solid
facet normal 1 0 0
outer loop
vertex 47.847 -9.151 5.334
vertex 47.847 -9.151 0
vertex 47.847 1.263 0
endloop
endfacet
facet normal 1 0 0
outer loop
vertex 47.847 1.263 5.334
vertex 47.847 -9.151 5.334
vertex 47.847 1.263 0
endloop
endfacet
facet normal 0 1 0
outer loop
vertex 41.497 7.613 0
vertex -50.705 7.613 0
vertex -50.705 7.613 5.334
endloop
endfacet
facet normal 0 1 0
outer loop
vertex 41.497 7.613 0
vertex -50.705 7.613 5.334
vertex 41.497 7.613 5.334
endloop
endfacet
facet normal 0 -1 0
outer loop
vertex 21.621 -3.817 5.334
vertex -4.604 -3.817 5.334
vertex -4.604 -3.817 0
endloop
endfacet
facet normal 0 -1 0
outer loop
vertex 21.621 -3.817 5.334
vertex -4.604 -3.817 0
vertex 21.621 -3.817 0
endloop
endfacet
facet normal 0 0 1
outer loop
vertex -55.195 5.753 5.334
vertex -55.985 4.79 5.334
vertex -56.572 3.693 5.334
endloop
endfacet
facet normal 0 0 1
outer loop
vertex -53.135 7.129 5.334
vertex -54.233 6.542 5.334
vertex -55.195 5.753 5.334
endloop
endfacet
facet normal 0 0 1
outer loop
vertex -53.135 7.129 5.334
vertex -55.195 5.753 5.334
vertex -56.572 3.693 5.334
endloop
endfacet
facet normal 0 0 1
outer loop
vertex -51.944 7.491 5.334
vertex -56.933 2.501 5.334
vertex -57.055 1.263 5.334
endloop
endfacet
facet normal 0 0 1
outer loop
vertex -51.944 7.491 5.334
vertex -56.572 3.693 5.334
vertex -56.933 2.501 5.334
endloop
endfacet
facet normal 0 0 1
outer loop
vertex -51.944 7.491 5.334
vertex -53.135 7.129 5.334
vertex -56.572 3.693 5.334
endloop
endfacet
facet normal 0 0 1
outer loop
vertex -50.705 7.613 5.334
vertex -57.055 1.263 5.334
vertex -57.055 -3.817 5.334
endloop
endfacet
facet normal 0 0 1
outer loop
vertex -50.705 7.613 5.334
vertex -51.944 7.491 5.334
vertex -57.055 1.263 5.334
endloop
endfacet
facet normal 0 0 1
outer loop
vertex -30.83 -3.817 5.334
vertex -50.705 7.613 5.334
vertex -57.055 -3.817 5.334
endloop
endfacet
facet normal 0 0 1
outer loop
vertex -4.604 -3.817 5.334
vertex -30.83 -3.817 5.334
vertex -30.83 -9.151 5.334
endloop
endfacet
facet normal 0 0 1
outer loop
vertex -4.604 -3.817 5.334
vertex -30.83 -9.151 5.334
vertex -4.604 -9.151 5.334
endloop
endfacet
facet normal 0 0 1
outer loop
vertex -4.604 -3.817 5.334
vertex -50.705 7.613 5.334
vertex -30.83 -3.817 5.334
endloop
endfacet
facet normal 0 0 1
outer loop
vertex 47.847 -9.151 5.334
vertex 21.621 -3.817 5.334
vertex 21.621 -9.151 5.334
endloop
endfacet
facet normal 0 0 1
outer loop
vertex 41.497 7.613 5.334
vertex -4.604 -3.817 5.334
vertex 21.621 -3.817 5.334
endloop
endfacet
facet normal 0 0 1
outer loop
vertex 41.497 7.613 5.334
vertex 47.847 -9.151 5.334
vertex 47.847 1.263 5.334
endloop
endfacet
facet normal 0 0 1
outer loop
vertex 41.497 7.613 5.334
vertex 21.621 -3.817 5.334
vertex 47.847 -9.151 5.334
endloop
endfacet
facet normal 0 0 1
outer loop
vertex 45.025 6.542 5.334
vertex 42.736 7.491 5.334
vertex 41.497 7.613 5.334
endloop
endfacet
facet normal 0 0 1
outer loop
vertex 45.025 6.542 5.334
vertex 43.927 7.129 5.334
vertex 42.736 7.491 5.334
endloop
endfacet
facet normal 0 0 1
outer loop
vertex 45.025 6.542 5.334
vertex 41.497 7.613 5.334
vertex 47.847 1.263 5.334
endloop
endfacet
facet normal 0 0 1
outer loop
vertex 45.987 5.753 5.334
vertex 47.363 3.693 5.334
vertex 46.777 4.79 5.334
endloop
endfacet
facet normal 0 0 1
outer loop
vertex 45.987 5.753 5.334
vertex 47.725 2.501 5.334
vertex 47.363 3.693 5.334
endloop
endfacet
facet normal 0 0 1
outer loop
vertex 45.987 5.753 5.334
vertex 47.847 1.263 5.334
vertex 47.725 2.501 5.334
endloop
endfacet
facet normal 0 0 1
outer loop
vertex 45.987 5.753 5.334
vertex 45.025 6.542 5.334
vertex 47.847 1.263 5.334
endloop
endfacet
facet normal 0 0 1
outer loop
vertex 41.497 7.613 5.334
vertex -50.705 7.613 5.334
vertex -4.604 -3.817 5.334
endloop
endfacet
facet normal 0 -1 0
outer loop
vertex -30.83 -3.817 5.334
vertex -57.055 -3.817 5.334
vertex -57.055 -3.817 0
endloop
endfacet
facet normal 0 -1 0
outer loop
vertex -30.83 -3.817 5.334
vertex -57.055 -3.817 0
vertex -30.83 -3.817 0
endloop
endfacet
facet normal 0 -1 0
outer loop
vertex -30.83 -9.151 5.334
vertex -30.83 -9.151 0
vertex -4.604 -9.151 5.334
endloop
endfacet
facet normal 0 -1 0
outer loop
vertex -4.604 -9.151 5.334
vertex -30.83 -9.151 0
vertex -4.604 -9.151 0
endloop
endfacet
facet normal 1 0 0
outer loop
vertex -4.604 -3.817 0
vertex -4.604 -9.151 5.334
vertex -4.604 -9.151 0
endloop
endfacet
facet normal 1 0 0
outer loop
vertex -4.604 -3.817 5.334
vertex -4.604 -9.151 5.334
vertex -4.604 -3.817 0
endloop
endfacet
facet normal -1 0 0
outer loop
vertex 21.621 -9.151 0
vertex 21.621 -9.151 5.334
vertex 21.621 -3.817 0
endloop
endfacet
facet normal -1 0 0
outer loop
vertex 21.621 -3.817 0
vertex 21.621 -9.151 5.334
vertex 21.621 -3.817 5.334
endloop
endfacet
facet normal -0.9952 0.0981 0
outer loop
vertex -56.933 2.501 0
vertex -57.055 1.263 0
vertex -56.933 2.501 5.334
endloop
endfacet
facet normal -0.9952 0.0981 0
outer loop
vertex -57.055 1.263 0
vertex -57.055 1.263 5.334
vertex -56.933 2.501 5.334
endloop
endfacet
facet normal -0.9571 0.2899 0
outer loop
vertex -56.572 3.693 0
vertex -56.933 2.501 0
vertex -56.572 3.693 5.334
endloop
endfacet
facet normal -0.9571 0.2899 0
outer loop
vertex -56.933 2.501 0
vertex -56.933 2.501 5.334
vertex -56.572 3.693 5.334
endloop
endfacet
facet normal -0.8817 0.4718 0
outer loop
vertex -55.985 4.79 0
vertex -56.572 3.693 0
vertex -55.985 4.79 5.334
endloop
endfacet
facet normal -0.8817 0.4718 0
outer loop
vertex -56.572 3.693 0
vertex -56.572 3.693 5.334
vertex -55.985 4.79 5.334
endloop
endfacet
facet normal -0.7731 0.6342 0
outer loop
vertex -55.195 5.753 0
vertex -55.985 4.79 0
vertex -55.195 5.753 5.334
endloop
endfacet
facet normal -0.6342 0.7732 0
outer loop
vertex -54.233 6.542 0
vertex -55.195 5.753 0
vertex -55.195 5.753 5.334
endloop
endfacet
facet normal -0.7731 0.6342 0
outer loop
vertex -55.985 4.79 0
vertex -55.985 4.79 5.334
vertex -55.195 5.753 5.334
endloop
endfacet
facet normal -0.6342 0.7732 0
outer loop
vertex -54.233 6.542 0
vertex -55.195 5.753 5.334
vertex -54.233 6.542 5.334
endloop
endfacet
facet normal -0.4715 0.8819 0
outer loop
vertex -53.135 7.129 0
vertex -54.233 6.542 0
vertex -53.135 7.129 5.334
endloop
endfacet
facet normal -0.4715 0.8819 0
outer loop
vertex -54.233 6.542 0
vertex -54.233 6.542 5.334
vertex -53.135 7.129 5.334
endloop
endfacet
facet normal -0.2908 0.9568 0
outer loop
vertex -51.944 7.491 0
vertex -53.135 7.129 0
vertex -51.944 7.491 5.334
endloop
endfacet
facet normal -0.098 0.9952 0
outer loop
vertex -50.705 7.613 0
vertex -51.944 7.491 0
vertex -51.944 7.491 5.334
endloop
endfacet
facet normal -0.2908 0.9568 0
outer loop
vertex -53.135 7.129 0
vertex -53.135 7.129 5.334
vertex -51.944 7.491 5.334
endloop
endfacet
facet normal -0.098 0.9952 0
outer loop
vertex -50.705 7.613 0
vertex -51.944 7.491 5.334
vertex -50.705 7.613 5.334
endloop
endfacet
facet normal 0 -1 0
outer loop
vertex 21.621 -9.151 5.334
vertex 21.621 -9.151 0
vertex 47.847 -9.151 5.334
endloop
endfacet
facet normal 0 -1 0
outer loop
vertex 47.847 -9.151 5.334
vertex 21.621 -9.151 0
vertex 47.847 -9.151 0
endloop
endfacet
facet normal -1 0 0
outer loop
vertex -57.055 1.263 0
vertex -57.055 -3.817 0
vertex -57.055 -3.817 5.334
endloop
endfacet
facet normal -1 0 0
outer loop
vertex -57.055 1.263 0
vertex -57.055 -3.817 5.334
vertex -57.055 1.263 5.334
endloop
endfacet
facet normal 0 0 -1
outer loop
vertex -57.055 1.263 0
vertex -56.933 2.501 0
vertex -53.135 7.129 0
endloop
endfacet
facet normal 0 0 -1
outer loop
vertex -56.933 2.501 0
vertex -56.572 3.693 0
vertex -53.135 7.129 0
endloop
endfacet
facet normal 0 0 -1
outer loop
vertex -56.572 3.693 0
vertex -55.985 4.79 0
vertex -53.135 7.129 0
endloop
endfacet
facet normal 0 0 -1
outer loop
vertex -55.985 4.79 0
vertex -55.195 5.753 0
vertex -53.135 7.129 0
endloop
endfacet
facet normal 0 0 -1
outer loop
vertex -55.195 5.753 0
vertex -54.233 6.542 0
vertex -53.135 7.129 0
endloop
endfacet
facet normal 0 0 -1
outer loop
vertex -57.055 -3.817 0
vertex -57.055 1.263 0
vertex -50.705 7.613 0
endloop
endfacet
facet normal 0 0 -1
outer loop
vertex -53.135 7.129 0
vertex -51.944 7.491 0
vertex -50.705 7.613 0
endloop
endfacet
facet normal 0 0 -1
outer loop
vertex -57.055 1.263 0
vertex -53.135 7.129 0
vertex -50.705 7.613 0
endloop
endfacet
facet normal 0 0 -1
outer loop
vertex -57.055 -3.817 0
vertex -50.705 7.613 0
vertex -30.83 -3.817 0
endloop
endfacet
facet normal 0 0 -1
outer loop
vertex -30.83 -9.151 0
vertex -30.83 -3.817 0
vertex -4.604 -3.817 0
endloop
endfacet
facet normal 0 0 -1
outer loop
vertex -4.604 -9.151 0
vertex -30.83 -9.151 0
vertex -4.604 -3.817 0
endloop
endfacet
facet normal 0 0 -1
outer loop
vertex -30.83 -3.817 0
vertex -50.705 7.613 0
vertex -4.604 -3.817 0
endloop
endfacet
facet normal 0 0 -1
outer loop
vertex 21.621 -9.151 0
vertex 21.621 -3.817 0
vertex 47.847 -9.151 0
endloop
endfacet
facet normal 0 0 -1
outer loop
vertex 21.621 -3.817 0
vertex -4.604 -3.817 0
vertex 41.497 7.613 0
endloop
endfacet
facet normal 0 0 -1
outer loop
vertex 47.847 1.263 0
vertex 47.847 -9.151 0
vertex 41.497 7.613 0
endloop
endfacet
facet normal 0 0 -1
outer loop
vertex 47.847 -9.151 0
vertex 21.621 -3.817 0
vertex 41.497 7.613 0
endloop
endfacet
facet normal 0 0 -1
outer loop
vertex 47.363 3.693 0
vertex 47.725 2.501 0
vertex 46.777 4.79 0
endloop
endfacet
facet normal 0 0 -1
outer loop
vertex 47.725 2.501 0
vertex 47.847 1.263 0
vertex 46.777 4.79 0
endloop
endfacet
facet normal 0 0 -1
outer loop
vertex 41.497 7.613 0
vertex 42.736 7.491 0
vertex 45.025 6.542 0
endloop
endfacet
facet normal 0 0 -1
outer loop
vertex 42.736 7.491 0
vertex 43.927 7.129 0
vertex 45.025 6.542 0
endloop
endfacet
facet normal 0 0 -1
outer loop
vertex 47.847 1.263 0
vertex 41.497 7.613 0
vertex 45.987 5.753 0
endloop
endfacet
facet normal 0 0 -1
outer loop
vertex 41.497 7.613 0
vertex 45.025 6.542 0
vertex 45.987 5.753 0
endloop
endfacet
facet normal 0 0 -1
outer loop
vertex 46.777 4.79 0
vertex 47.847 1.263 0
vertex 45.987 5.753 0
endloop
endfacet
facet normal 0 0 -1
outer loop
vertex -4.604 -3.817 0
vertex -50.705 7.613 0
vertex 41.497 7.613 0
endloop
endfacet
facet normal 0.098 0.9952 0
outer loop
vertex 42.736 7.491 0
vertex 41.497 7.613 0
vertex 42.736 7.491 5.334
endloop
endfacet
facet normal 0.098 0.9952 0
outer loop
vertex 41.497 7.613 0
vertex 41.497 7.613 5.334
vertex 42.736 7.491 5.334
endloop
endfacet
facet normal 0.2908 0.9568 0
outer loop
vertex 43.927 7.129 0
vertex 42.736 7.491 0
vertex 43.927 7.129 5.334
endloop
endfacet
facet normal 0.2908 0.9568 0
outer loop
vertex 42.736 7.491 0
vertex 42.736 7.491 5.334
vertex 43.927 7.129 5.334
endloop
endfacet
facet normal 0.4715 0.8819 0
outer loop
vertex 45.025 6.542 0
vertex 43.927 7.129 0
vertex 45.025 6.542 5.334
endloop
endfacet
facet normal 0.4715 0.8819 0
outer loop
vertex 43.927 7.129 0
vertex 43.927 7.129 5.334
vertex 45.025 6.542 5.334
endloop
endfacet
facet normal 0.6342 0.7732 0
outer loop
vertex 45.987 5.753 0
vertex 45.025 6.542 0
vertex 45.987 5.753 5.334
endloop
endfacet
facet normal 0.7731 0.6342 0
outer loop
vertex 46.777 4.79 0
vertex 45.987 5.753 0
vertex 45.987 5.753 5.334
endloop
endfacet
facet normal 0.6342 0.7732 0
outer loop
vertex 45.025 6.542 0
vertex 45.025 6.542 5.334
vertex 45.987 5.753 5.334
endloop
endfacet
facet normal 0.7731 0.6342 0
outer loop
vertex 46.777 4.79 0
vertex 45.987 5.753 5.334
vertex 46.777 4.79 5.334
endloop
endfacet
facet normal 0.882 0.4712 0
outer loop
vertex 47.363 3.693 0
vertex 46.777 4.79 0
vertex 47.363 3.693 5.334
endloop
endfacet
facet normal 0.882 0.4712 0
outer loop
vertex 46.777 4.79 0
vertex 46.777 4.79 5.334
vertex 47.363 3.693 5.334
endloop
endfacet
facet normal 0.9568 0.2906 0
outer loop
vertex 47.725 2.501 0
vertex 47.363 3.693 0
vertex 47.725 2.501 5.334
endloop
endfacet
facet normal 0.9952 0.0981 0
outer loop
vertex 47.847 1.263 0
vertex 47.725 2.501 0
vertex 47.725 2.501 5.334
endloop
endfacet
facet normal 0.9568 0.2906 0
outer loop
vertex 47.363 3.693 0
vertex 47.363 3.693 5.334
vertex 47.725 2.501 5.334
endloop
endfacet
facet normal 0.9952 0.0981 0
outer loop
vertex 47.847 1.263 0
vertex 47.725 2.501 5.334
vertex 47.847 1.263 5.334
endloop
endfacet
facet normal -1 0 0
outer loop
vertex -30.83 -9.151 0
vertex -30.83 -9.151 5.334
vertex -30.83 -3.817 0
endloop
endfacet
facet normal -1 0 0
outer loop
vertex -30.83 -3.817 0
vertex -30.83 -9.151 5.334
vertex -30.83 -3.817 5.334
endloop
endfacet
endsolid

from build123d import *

# Parameters (mm, degrees)
SKETCH1_W           = 104.902
SKETCH1_H           = 16.764
BOSS_EXTRUDE1_DEPTH = 5.334
SKETCH2_W           = 26.2255
SKETCH2_H           = 5.334
CUT_EXTRUDE1_DEPTH  = 59.030232747
FILLET1_R           = 6.35


with BuildPart() as part:
    # Sketch1 → Boss-Extrude1 (new body)
    with BuildSketch(Plane.XY):
        with Locations((-4.604300362, -0.769451102)):
            Rectangle(SKETCH1_W, SKETCH1_H)
    extrude(amount=BOSS_EXTRUDE1_DEPTH)

    # Sketch2 → Cut-Extrude1 (cut, through all)
    with BuildSketch(Plane.XY.offset(5.334)):
        with Locations((-43.942550362, -6.484451102)):
            Rectangle(SKETCH2_W, SKETCH2_H)
        with Locations((8.508449638, -6.484451102)):
            Rectangle(SKETCH2_W, SKETCH2_H)
    extrude(amount=-CUT_EXTRUDE1_DEPTH, mode=Mode.SUBTRACT)

    # Fillet1
    fillet1_edges = [part.edges().sort_by_distance(p)[0] for p in [
        (-57.055300362, 7.612548898, 2.667),
        (47.846699638, 7.612548898, 2.667),
    ]]
    fillet(fillet1_edges, radius=FILLET1_R)


solid = part.part
